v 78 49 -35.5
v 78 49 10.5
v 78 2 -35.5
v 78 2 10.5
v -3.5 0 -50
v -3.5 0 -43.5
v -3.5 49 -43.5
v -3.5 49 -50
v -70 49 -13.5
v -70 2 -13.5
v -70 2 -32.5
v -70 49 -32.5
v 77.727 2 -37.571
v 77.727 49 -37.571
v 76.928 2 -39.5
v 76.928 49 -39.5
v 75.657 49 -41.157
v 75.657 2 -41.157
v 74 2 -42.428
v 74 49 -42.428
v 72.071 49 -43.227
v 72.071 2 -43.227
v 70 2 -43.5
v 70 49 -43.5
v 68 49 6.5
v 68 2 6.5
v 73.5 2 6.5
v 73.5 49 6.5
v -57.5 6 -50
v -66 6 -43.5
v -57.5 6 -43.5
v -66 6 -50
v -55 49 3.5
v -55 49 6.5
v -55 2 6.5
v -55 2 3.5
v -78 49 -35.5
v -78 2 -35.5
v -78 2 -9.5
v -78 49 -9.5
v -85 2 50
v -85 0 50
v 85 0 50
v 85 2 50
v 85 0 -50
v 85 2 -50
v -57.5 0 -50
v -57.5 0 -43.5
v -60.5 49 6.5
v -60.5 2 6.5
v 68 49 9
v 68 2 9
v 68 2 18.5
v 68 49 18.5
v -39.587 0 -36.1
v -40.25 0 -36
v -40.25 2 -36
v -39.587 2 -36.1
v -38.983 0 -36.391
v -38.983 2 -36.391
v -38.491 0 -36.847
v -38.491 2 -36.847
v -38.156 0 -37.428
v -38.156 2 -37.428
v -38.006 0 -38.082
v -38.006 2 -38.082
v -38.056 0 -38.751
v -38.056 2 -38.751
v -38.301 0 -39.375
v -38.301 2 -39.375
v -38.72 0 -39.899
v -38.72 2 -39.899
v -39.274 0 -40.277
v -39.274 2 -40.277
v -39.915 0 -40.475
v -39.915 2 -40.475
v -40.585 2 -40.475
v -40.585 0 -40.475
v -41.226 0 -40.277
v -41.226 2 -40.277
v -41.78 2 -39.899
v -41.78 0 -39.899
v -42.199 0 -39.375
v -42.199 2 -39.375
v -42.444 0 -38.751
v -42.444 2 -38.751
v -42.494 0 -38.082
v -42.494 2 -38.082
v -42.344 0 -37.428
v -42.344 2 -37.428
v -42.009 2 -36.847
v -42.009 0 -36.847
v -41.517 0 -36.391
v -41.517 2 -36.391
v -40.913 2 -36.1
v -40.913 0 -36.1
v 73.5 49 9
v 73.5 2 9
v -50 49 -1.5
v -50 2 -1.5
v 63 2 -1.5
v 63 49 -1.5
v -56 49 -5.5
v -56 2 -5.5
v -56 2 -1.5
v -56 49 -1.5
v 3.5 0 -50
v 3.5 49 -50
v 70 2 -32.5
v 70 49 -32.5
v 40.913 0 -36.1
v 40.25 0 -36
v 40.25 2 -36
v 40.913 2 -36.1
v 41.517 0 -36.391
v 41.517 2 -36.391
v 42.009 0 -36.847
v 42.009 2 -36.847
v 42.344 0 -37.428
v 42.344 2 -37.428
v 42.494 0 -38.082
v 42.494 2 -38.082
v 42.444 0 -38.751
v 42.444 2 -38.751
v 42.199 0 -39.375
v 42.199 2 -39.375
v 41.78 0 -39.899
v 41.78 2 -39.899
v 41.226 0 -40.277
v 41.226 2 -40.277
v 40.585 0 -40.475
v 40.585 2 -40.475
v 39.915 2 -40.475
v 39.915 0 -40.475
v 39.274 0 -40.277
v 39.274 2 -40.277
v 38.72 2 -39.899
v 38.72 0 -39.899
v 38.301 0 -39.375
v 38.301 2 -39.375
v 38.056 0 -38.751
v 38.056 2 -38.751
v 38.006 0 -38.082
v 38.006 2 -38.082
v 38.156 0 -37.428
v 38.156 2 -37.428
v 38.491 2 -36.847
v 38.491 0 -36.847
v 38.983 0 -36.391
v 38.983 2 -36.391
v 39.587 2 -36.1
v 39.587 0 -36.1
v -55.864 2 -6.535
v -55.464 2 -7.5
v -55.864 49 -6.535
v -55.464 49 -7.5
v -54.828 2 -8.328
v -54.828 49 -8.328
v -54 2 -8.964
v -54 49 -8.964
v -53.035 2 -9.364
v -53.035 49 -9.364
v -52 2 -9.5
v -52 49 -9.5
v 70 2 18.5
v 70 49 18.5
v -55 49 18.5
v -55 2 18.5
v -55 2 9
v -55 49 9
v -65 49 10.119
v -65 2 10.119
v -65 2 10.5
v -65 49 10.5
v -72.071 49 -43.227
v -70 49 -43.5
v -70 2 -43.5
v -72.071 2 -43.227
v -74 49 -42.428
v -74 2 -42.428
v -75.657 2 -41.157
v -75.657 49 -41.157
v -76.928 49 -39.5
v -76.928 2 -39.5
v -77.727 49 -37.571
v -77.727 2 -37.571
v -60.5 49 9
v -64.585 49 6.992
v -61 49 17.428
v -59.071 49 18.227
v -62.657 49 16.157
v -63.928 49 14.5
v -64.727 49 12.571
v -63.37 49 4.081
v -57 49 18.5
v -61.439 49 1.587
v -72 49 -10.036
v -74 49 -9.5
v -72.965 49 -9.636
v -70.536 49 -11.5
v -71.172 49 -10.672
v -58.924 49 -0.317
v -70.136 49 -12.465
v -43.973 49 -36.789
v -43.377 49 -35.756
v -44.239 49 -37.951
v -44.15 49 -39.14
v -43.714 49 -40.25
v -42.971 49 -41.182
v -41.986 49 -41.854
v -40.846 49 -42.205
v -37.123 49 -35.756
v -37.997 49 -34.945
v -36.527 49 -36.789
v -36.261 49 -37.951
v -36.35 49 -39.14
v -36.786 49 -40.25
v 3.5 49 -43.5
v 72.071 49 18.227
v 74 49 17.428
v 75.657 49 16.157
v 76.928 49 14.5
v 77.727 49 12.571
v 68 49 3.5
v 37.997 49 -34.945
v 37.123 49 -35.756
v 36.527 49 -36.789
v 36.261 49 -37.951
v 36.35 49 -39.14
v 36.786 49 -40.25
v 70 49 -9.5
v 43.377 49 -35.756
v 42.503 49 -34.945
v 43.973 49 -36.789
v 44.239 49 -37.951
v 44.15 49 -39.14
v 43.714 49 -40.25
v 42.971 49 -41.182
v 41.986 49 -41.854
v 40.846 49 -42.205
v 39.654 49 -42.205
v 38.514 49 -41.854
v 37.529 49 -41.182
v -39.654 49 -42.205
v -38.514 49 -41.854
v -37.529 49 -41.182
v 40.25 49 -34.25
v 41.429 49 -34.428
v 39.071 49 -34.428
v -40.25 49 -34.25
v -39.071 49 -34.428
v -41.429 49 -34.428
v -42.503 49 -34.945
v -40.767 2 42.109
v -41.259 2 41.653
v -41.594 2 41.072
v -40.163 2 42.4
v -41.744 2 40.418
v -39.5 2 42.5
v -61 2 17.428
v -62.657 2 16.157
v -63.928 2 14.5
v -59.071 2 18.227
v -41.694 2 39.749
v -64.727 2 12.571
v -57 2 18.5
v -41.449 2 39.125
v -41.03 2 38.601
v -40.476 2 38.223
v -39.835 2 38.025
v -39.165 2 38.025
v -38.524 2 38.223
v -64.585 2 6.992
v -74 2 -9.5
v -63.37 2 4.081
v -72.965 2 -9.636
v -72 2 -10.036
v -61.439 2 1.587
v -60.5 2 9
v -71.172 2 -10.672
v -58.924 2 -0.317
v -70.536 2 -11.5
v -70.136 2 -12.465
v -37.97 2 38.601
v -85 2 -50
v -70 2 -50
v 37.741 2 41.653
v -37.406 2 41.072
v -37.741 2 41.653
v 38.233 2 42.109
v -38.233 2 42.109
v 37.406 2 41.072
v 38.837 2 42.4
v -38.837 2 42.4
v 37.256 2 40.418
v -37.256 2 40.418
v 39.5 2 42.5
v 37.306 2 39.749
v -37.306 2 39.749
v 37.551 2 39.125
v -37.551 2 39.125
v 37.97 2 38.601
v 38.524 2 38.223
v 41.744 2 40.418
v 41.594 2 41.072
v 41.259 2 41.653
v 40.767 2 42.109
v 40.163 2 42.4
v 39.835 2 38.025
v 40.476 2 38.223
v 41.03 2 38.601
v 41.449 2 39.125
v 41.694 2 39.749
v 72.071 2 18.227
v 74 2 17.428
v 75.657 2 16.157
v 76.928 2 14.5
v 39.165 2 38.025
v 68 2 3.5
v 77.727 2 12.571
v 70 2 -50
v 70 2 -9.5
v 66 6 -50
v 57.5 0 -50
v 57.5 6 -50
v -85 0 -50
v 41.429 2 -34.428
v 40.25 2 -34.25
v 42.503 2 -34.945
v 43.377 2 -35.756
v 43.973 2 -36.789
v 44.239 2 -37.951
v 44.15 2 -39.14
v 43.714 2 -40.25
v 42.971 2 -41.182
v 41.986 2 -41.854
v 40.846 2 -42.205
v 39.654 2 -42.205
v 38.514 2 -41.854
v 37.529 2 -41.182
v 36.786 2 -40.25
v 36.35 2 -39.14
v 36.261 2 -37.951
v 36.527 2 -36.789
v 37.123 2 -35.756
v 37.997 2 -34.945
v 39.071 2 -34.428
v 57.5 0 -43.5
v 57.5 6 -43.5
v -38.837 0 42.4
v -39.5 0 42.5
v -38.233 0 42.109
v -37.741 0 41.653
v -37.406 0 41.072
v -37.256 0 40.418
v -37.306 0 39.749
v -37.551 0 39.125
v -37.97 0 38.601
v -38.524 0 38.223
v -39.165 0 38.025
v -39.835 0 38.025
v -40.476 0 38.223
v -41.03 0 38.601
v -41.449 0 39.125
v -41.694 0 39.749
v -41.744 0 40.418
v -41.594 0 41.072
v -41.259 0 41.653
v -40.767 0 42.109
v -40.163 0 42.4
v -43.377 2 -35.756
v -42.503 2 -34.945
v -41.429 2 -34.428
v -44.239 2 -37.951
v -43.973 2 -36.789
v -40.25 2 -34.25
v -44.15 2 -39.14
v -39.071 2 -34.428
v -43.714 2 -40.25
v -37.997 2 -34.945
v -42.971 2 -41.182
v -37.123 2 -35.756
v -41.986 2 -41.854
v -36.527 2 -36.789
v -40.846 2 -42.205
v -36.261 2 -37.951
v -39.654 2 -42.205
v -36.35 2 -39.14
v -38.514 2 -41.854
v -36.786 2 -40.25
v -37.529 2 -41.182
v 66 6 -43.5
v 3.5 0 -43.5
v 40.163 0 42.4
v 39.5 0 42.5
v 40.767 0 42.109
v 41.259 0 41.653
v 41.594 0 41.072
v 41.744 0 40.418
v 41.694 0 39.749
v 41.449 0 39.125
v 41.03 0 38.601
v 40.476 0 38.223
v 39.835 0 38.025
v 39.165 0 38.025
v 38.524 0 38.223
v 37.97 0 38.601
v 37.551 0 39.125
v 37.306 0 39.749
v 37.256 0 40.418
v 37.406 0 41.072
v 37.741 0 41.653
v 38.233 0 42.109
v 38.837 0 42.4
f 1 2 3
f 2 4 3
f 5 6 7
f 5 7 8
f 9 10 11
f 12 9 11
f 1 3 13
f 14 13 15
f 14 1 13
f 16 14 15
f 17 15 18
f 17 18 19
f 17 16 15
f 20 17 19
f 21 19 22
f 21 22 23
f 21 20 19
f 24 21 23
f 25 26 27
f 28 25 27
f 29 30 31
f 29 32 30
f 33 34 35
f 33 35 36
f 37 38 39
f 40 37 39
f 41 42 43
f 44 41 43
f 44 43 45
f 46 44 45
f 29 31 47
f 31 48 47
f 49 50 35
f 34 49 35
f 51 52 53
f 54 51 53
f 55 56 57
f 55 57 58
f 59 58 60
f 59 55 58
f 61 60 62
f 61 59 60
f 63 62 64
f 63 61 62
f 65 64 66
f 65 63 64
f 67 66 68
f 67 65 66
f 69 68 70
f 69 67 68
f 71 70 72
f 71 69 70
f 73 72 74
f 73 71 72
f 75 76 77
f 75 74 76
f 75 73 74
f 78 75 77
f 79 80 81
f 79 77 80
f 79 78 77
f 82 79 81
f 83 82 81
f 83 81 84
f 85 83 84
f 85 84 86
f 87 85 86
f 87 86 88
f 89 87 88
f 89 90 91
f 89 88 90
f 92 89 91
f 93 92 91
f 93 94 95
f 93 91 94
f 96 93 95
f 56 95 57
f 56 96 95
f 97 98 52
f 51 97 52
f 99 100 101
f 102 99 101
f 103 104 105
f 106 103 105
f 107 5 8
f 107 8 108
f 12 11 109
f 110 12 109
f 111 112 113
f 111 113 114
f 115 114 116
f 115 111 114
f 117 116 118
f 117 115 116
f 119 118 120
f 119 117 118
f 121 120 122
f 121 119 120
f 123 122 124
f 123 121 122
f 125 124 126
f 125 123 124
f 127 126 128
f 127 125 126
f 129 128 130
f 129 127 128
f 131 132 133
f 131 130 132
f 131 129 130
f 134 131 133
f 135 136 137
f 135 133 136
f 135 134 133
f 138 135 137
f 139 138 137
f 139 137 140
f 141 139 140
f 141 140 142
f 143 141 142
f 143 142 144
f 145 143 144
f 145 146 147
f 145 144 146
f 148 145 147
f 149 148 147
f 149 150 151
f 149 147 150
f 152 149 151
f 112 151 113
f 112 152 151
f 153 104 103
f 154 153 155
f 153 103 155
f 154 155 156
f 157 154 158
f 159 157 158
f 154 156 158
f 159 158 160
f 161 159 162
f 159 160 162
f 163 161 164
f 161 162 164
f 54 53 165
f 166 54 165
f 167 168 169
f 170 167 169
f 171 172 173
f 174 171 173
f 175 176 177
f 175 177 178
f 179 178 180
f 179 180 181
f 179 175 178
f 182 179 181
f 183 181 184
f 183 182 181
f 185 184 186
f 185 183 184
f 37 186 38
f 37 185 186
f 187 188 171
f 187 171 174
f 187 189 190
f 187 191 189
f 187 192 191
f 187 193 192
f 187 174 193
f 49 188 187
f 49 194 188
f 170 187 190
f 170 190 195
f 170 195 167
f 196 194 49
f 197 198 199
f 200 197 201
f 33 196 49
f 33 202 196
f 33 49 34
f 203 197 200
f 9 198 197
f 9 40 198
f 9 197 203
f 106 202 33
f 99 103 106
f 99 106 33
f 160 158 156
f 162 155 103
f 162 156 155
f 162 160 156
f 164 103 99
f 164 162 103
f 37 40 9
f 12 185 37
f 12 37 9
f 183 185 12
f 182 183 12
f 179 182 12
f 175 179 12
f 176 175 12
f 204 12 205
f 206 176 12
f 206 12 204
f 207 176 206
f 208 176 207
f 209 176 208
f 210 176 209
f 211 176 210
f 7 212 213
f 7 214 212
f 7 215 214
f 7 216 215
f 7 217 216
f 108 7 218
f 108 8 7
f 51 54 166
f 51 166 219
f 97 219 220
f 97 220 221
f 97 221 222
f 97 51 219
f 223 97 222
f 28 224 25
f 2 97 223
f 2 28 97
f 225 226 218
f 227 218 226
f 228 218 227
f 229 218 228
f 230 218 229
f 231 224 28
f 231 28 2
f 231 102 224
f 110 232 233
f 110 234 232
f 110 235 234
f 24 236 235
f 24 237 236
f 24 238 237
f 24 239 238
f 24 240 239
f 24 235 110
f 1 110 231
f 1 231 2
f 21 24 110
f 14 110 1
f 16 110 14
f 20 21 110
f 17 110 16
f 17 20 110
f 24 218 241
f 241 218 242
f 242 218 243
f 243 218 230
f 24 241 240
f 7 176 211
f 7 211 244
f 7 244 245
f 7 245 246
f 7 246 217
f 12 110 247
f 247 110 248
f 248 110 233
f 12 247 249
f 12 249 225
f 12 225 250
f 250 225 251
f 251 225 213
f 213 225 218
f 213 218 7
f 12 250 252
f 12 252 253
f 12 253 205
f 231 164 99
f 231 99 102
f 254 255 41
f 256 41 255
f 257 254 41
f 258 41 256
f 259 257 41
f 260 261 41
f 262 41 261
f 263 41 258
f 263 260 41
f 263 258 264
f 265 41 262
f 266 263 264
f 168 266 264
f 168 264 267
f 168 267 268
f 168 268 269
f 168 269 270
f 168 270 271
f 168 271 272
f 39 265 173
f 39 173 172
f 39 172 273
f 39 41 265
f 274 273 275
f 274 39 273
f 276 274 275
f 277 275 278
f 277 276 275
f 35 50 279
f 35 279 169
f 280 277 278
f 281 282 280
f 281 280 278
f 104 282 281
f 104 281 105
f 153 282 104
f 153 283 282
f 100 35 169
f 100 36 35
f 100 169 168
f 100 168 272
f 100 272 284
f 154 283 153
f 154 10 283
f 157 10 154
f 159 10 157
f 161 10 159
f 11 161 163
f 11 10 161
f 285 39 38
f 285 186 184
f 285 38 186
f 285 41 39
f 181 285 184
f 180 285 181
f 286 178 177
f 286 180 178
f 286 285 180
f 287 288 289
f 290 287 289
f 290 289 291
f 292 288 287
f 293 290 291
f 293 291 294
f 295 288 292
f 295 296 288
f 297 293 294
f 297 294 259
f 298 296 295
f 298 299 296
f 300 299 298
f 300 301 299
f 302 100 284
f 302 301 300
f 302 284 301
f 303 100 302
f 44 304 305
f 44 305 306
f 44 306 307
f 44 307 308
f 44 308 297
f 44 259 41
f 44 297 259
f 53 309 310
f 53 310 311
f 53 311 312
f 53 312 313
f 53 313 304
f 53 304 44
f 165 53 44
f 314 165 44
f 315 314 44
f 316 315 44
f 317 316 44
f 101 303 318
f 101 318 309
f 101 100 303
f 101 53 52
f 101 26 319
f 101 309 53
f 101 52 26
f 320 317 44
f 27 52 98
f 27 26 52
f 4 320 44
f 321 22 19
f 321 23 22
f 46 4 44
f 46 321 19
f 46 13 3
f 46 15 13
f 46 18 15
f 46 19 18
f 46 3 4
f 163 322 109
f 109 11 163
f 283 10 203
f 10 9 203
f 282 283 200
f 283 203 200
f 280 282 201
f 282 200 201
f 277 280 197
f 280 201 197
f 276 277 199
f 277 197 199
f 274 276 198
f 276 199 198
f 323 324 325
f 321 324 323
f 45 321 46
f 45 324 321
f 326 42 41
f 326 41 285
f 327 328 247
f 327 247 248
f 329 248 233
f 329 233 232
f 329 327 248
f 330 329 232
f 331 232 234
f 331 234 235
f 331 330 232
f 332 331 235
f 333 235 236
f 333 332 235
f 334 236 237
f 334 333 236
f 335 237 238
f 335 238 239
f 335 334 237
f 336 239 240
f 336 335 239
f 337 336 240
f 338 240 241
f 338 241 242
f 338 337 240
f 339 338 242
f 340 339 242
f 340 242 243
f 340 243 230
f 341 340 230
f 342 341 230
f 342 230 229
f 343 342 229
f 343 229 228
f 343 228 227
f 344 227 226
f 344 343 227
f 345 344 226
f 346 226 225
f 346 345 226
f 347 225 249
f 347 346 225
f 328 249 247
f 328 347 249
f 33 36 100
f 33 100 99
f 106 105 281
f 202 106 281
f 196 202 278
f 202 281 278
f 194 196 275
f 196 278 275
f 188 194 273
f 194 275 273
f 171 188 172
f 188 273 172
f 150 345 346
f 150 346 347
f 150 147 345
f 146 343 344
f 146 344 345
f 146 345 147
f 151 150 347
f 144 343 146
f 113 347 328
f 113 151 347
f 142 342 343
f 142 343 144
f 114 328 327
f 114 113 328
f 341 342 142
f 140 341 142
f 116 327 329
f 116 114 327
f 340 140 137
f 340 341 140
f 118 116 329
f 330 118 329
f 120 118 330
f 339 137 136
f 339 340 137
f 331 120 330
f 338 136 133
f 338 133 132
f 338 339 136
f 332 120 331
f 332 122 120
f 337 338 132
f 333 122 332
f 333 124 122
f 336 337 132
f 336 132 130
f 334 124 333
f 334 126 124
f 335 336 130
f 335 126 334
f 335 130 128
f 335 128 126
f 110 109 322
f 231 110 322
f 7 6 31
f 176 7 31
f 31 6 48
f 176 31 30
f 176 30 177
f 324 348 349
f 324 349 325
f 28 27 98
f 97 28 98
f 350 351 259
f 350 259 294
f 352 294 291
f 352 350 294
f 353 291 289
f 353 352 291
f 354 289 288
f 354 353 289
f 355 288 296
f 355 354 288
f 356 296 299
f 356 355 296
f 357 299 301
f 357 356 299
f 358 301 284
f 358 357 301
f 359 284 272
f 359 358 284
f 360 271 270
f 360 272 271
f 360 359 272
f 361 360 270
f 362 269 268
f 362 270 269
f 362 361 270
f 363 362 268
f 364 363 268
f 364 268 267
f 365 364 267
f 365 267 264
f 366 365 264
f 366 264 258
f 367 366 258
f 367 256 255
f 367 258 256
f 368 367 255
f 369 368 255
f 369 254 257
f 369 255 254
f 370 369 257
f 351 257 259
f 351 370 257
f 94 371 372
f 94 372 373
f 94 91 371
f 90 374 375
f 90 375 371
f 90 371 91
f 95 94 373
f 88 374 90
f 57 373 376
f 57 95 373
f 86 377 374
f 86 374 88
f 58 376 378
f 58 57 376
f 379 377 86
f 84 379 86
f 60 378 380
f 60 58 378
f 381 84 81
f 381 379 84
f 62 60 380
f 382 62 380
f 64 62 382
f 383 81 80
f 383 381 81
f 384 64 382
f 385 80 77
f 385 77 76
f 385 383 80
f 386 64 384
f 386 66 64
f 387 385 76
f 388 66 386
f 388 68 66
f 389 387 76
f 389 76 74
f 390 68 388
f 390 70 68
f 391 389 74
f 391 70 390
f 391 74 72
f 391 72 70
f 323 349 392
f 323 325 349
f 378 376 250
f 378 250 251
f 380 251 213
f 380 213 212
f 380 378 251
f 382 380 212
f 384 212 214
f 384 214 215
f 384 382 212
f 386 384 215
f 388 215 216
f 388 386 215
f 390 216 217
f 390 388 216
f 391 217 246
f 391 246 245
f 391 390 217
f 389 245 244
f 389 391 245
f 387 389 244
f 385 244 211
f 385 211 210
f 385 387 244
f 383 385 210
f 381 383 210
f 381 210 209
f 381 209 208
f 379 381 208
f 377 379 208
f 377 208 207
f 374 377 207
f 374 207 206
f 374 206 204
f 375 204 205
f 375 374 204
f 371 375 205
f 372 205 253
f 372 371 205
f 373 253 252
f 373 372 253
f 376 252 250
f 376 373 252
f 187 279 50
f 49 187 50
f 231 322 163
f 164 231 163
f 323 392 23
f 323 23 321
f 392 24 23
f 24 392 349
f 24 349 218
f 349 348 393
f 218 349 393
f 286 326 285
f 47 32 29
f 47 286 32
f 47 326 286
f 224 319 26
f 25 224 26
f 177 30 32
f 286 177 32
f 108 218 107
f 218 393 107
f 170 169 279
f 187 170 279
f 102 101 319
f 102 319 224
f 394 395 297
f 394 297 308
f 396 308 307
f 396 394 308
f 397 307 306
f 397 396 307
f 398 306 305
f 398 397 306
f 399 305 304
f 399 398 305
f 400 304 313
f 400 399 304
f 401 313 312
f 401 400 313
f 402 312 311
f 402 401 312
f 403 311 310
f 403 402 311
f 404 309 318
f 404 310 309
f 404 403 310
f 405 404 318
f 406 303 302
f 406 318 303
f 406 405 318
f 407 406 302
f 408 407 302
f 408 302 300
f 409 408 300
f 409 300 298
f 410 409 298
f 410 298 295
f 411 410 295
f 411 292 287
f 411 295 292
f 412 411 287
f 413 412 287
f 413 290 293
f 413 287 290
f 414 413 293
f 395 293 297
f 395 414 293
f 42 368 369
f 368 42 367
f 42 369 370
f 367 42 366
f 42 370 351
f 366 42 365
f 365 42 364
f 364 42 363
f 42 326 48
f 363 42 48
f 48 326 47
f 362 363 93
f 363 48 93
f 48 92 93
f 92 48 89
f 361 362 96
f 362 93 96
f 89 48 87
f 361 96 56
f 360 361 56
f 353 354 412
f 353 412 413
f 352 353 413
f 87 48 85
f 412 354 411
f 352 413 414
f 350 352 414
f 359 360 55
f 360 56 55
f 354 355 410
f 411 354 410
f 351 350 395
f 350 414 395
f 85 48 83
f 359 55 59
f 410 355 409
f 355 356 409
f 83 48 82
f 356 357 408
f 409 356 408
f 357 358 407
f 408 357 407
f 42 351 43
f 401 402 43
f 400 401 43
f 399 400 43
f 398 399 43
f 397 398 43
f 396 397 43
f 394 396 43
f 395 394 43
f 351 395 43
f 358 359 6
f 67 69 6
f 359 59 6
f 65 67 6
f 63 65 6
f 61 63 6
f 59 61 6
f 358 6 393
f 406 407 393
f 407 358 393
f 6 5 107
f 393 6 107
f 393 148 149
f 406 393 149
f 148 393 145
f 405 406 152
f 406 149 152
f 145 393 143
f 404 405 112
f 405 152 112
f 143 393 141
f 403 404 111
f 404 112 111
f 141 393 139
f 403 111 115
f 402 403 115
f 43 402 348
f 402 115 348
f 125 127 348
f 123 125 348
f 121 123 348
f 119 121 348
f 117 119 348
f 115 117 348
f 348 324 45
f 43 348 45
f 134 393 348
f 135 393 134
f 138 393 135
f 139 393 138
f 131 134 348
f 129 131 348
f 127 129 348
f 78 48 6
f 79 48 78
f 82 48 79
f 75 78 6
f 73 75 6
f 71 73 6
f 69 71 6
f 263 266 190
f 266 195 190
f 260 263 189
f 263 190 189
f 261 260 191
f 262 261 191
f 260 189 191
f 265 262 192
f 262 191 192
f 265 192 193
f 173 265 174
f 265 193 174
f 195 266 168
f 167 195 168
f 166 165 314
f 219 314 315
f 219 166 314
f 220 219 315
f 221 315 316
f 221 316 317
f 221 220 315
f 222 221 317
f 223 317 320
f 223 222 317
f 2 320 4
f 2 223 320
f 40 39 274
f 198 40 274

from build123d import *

# Parameters (mm, degrees)
SKETCH1_W               = 170
SKETCH1_H               = 100
BOSS_EXTRUDE1_DEPTH     = 2
CUT_EXTRUDE7_DEPTH      = 99.635693337
CUT_EXTRUDE7_DEPTH_BACK = 99.635693337
SKETCH14_R              = 2.25
CUT_EXTRUDE8_DEPTH      = 99.635693337
CUT_EXTRUDE8_DEPTH_BACK = 99.635693337
SKETCH15_W              = 54
SKETCH15_H              = 6.5
SKETCH16_R              = 4
SKETCH16_W              = 7
SKETCH16_H              = 6.5
BOSS_EXTRUDE4_DEPTH     = 47
FILLET1_R               = 4
CHAMFER1_SIZE           = 5
FILLET2_R               = 8
SKETCH17_W              = 12.5
SKETCH17_H              = 6.5
BOSS_EXTRUDE5_DEPTH     = 4
CHAMFER2_SIZE           = 4
FILLET3_R               = 12


# Some blends are built 0.0001 mm under size
with BuildPart() as part:
    # Sketch1 → Boss-Extrude1 (new body)
    with BuildSketch(Plane(origin=(0, 0, 0), x_dir=(1, 0, 0), z_dir=(0, 1, 0))):
        Rectangle(SKETCH1_W, SKETCH1_H)
    extrude(amount=BOSS_EXTRUDE1_DEPTH)

    # Sketch14 → Cut-Extrude7 (cut, two sides: drawn at the far end of the back side and taken through both)
    with BuildSketch(Plane(origin=(0, 2, 0), x_dir=(1, 0, 0), z_dir=(0, 1, 0)).offset(-CUT_EXTRUDE7_DEPTH_BACK)):
        with Locations(Location((-40.25, 38.25, 0), (0, 0, 270))):
            Circle(SKETCH14_R)
        with Locations(Location((40.25, 38.25, 0), (0, 0, 270))):
            Circle(SKETCH14_R)
        with Locations(Location((-39.5, -40.25, 0), (0, 0, 270))):
            Circle(SKETCH14_R)
        with Locations(Location((39.5, -40.25, 0), (0, 0, 270))):
            Circle(SKETCH14_R)
    extrude(amount=CUT_EXTRUDE7_DEPTH + CUT_EXTRUDE7_DEPTH_BACK, mode=Mode.SUBTRACT)

    # Sketch15 → Cut-Extrude8 (cut, two sides: drawn at the far end of the back side and taken through both)
    with BuildSketch(Plane(origin=(0, 2, 0), x_dir=(1, 0, 0), z_dir=(0, 1, 0)).offset(-CUT_EXTRUDE8_DEPTH_BACK)):
        with Locations((-30.5, 46.75)):
            Rectangle(SKETCH15_W, SKETCH15_H)
        with Locations((30.5, 46.75)):
            Rectangle(SKETCH15_W, SKETCH15_H)
    extrude(amount=CUT_EXTRUDE8_DEPTH + CUT_EXTRUDE8_DEPTH_BACK, mode=Mode.SUBTRACT)

    # Sketch16 → Boss-Extrude4 (add)
    # profile 1 of 7: a face of its own
    with BuildSketch(Plane(origin=(0, 2, 0), x_dir=(1, 0, 0), z_dir=(0, 1, 0))):
        Polygon((-70, 32.5), (-70, 43.5), (-78, 43.5), (-78, 9.5), (-70, 9.5), align=None)
    # profile 2 of 7: a face of its own
    with BuildSketch(Plane(origin=(0, 2, 0), x_dir=(1, 0, 0), z_dir=(0, 1, 0))):
        Polygon((-57.5, 43.5), (-70, 43.5), (-70, 32.5), (70, 32.5), (70, 43.5), (57.5, 43.5), (3.5, 43.5), (-3.5, 43.5), align=None)
        with Locations(Location((-40.25, 38.25, 0), (0, 0, 270))):
            Circle(SKETCH16_R, mode=Mode.SUBTRACT)
        with Locations(Location((40.25, 38.25, 0), (0, 0, 270))):
            Circle(SKETCH16_R, mode=Mode.SUBTRACT)
    # profile 3 of 7: a face of its own
    with BuildSketch(Plane(origin=(0, 2, 0), x_dir=(1, 0, 0), z_dir=(0, 1, 0))):
        with Locations((0, 46.75)):
            Rectangle(SKETCH16_W, SKETCH16_H)
    # profile 4 of 7: a face of its own
    with BuildSketch(Plane(origin=(0, 2, 0), x_dir=(1, 0, 0), z_dir=(0, 1, 0))):
        Polygon((70, 43.5), (70, 32.5), (70, 9.5), (78, 9.5), (78, 43.5), align=None)
    # profile 5 of 7: a face of its own
    with BuildSketch(Plane(origin=(0, 2, 0), x_dir=(1, 0, 0), z_dir=(0, 1, 0))):
        Polygon((78, 9.5), (70, 9.5), (-56, 9.5), (-56, 1.5), (-55, 1.5), (68, 1.5), (78, 1.5), align=None)
    # profile 6 of 7: a face of its own
    with BuildSketch(Plane(origin=(0, 2, 0), x_dir=(1, 0, 0), z_dir=(0, 1, 0))):
        Polygon((78, -18.5), (78, 1.5), (68, 1.5), (68, -6.5), (73.5, -6.5), (73.5, -9), (68, -9), (68, -18.5), align=None)
    # profile 7 of 7: a face of its own
    with BuildSketch(Plane(origin=(0, 2, 0), x_dir=(1, 0, 0), z_dir=(0, 1, 0))):
        Polygon((-55, 1.5), (-56, 1.5), (-65, 1.5), (-65, -18.5), (-55, -18.5), (-55, -9), (-60.5, -9), (-60.5, -6.5), (-55, -6.5), align=None)
    extrude(amount=BOSS_EXTRUDE4_DEPTH)

    # Fillet1
    fillet1_edges = [part.edges().sort_by_distance(p)[0] for p in [
        (-70, 25.5, -9.5),
        (-56, 25.5, -9.5),
    ]]
    fillet(fillet1_edges, radius=FILLET1_R)

    # Chamfer1
    chamfer1_edges = [part.edges().sort_by_distance(p)[0] for p in [
        (-55, 25.5, -1.5),
        (68, 25.5, -1.5),
    ]]
    chamfer(chamfer1_edges, length=CHAMFER1_SIZE)

    # Fillet2
    fillet2_edges = [part.edges().sort_by_distance(p)[0] for p in [
        (-78, 25.5, -43.5),
        (-65, 25.5, 18.5),
        (78, 25.5, 18.5),
        (78, 25.5, -43.5),
    ]]
    fillet(fillet2_edges, radius=FILLET2_R)

    # Sketch17 → Boss-Extrude5 (add)
    with BuildSketch(Plane(origin=(0, 2, 0), x_dir=(1, 0, 0), z_dir=(0, 1, 0))):
        with Locations((-63.75, 46.75)):
            Rectangle(SKETCH17_W, SKETCH17_H)
        with Locations((63.75, 46.75)):
            Rectangle(SKETCH17_W, SKETCH17_H)
    extrude(amount=BOSS_EXTRUDE5_DEPTH)

    # Chamfer2
    chamfer2_edges = [part.edges().sort_by_distance(p)[0] for p in [
        (70, 6, -46.75),
        (-70, 6, -46.75),
    ]]
    chamfer(chamfer2_edges, length=CHAMFER2_SIZE - 0.0001)  # a hair under: the kernel refuses the full size

    # Fillet3
    # the kernel refuses this fillet: 12 mm, written as the material it takes off along each edge
    with BuildSketch(Plane(origin=(-65, 2, -1.5), x_dir=(0, 0, 1), z_dir=(0, 1, 0))) as fillet3_piece_1:
        with BuildLine():
            CenterArc((11.618950039, 12), FILLET3_R, 194.477512186, 75.522487814)
            Line((0, 9), (0, 0))
            Line((0, 0), (11.618950039, 0))
        make_face()
    extrude(amount=76.047375097, mode=Mode.SUBTRACT)


solid = part.part
